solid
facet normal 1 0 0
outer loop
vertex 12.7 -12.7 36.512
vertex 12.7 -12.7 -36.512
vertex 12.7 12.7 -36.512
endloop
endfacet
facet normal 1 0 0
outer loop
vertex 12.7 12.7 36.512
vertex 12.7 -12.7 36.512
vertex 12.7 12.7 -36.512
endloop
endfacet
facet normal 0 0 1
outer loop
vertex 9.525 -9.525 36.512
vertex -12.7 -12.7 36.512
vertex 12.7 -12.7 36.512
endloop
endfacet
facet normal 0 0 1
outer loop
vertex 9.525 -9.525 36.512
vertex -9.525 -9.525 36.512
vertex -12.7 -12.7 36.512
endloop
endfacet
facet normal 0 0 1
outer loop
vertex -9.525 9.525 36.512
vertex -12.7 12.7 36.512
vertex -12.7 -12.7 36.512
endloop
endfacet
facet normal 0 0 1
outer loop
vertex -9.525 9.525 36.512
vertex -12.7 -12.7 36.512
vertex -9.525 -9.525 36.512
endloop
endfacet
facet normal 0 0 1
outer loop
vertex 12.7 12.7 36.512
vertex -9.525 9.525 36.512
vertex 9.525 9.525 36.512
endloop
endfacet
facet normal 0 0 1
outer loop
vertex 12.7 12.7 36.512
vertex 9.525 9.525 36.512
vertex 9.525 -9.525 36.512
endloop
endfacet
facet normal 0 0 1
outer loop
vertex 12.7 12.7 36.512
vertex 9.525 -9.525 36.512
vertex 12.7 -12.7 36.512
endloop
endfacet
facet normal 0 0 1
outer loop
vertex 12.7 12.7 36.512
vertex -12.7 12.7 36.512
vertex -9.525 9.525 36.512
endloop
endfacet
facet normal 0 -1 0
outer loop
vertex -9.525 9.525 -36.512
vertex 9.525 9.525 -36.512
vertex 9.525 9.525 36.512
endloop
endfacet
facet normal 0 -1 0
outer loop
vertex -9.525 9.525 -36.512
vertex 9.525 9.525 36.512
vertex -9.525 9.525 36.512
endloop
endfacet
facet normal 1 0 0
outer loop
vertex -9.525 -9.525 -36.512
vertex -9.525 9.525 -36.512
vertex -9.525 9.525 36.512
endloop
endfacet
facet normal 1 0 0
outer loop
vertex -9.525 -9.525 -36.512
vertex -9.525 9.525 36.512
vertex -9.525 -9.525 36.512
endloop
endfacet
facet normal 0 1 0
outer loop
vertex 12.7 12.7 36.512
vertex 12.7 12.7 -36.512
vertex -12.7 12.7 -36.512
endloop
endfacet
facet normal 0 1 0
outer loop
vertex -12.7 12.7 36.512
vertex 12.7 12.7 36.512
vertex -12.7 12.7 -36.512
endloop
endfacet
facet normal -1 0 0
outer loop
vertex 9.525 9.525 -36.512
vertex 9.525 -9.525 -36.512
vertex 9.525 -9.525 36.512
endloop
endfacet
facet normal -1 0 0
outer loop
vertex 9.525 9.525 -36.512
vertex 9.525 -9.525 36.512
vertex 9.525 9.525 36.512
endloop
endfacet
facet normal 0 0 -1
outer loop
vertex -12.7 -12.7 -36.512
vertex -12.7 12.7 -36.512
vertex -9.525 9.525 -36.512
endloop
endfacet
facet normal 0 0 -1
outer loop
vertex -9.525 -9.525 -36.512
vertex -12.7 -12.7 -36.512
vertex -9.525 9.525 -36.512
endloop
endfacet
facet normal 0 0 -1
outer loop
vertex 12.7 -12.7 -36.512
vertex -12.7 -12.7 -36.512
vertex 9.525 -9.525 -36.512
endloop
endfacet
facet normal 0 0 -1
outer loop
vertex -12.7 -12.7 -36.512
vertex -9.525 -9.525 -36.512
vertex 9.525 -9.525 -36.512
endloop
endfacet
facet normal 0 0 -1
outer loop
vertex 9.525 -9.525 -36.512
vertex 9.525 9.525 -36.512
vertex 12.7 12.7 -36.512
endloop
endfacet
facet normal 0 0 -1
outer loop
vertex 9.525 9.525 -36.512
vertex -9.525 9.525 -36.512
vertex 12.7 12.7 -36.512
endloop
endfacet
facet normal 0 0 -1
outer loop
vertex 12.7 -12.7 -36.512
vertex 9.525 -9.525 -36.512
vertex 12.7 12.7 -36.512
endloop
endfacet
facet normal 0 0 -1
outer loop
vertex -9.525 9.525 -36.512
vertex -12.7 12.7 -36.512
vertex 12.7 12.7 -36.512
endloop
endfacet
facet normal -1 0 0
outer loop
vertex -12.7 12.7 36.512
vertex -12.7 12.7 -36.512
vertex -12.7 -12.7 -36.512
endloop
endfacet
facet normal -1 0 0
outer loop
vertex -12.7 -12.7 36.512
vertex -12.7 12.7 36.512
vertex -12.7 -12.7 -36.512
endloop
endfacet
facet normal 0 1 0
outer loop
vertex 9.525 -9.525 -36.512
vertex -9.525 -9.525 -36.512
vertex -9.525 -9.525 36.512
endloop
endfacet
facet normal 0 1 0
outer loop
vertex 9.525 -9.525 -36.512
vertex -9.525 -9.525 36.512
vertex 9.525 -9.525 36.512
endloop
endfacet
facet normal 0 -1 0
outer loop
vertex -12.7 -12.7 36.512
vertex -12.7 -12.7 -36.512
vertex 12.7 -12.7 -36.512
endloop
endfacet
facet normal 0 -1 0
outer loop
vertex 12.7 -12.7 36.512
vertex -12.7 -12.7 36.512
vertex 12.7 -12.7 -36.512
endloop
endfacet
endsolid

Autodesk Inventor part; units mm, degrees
ref_plane "YZ Plane" through (0, 0, 0) normal (1, 0, 0) x (0, 1, 0)
ref_plane "XZ Plane" through (0, 0, 0) normal (0, 1, 0) x (-1, 0, 0)
ref_plane "XY Plane" through (0, 0, 0) normal (0, 0, 1) x (1, 0, 0)
sketch "Sketch1" plane through (0, 0, 0) normal (0, 0, 1) x (1, 0, 0)
  line L0 (-12.7, -12.7) -> (12.7, -12.7)
  line L1 (12.7, -12.7) -> (12.7, 12.7)
  line L2 (12.7, 12.7) -> (-12.7, 12.7)
  line L3 (-12.7, 12.7) -> (-12.7, -12.7)
  line L4 (-12.7, -12.7) -> (12.7, 12.7) construction
  line L5 (12.7, -12.7) -> (-12.7, 12.7) construction
  line L6 (-9.525, -9.525) -> (9.525, -9.525)
  line L7 (9.525, -9.525) -> (9.525, 9.525)
  line L8 (9.525, 9.525) -> (-9.525, 9.525)
  line L9 (-9.525, 9.525) -> (-9.525, -9.525)
  line L10 (-9.525, -9.525) -> (9.525, 9.525) construction
  line L11 (9.525, -9.525) -> (-9.525, 9.525) construction
  point P0 (0, 0)
  dimension "d0" = 25.4
  dimension "d1" = 25.4
  dimension "d2" = 3.175
  dimension "d3" = 3.175
extrude "Extrusion1" add sketch "Sketch1" along normal mid plane 73.025
properties part number "2_875-inchAluminumTubing" material "Aluminum 6061"
